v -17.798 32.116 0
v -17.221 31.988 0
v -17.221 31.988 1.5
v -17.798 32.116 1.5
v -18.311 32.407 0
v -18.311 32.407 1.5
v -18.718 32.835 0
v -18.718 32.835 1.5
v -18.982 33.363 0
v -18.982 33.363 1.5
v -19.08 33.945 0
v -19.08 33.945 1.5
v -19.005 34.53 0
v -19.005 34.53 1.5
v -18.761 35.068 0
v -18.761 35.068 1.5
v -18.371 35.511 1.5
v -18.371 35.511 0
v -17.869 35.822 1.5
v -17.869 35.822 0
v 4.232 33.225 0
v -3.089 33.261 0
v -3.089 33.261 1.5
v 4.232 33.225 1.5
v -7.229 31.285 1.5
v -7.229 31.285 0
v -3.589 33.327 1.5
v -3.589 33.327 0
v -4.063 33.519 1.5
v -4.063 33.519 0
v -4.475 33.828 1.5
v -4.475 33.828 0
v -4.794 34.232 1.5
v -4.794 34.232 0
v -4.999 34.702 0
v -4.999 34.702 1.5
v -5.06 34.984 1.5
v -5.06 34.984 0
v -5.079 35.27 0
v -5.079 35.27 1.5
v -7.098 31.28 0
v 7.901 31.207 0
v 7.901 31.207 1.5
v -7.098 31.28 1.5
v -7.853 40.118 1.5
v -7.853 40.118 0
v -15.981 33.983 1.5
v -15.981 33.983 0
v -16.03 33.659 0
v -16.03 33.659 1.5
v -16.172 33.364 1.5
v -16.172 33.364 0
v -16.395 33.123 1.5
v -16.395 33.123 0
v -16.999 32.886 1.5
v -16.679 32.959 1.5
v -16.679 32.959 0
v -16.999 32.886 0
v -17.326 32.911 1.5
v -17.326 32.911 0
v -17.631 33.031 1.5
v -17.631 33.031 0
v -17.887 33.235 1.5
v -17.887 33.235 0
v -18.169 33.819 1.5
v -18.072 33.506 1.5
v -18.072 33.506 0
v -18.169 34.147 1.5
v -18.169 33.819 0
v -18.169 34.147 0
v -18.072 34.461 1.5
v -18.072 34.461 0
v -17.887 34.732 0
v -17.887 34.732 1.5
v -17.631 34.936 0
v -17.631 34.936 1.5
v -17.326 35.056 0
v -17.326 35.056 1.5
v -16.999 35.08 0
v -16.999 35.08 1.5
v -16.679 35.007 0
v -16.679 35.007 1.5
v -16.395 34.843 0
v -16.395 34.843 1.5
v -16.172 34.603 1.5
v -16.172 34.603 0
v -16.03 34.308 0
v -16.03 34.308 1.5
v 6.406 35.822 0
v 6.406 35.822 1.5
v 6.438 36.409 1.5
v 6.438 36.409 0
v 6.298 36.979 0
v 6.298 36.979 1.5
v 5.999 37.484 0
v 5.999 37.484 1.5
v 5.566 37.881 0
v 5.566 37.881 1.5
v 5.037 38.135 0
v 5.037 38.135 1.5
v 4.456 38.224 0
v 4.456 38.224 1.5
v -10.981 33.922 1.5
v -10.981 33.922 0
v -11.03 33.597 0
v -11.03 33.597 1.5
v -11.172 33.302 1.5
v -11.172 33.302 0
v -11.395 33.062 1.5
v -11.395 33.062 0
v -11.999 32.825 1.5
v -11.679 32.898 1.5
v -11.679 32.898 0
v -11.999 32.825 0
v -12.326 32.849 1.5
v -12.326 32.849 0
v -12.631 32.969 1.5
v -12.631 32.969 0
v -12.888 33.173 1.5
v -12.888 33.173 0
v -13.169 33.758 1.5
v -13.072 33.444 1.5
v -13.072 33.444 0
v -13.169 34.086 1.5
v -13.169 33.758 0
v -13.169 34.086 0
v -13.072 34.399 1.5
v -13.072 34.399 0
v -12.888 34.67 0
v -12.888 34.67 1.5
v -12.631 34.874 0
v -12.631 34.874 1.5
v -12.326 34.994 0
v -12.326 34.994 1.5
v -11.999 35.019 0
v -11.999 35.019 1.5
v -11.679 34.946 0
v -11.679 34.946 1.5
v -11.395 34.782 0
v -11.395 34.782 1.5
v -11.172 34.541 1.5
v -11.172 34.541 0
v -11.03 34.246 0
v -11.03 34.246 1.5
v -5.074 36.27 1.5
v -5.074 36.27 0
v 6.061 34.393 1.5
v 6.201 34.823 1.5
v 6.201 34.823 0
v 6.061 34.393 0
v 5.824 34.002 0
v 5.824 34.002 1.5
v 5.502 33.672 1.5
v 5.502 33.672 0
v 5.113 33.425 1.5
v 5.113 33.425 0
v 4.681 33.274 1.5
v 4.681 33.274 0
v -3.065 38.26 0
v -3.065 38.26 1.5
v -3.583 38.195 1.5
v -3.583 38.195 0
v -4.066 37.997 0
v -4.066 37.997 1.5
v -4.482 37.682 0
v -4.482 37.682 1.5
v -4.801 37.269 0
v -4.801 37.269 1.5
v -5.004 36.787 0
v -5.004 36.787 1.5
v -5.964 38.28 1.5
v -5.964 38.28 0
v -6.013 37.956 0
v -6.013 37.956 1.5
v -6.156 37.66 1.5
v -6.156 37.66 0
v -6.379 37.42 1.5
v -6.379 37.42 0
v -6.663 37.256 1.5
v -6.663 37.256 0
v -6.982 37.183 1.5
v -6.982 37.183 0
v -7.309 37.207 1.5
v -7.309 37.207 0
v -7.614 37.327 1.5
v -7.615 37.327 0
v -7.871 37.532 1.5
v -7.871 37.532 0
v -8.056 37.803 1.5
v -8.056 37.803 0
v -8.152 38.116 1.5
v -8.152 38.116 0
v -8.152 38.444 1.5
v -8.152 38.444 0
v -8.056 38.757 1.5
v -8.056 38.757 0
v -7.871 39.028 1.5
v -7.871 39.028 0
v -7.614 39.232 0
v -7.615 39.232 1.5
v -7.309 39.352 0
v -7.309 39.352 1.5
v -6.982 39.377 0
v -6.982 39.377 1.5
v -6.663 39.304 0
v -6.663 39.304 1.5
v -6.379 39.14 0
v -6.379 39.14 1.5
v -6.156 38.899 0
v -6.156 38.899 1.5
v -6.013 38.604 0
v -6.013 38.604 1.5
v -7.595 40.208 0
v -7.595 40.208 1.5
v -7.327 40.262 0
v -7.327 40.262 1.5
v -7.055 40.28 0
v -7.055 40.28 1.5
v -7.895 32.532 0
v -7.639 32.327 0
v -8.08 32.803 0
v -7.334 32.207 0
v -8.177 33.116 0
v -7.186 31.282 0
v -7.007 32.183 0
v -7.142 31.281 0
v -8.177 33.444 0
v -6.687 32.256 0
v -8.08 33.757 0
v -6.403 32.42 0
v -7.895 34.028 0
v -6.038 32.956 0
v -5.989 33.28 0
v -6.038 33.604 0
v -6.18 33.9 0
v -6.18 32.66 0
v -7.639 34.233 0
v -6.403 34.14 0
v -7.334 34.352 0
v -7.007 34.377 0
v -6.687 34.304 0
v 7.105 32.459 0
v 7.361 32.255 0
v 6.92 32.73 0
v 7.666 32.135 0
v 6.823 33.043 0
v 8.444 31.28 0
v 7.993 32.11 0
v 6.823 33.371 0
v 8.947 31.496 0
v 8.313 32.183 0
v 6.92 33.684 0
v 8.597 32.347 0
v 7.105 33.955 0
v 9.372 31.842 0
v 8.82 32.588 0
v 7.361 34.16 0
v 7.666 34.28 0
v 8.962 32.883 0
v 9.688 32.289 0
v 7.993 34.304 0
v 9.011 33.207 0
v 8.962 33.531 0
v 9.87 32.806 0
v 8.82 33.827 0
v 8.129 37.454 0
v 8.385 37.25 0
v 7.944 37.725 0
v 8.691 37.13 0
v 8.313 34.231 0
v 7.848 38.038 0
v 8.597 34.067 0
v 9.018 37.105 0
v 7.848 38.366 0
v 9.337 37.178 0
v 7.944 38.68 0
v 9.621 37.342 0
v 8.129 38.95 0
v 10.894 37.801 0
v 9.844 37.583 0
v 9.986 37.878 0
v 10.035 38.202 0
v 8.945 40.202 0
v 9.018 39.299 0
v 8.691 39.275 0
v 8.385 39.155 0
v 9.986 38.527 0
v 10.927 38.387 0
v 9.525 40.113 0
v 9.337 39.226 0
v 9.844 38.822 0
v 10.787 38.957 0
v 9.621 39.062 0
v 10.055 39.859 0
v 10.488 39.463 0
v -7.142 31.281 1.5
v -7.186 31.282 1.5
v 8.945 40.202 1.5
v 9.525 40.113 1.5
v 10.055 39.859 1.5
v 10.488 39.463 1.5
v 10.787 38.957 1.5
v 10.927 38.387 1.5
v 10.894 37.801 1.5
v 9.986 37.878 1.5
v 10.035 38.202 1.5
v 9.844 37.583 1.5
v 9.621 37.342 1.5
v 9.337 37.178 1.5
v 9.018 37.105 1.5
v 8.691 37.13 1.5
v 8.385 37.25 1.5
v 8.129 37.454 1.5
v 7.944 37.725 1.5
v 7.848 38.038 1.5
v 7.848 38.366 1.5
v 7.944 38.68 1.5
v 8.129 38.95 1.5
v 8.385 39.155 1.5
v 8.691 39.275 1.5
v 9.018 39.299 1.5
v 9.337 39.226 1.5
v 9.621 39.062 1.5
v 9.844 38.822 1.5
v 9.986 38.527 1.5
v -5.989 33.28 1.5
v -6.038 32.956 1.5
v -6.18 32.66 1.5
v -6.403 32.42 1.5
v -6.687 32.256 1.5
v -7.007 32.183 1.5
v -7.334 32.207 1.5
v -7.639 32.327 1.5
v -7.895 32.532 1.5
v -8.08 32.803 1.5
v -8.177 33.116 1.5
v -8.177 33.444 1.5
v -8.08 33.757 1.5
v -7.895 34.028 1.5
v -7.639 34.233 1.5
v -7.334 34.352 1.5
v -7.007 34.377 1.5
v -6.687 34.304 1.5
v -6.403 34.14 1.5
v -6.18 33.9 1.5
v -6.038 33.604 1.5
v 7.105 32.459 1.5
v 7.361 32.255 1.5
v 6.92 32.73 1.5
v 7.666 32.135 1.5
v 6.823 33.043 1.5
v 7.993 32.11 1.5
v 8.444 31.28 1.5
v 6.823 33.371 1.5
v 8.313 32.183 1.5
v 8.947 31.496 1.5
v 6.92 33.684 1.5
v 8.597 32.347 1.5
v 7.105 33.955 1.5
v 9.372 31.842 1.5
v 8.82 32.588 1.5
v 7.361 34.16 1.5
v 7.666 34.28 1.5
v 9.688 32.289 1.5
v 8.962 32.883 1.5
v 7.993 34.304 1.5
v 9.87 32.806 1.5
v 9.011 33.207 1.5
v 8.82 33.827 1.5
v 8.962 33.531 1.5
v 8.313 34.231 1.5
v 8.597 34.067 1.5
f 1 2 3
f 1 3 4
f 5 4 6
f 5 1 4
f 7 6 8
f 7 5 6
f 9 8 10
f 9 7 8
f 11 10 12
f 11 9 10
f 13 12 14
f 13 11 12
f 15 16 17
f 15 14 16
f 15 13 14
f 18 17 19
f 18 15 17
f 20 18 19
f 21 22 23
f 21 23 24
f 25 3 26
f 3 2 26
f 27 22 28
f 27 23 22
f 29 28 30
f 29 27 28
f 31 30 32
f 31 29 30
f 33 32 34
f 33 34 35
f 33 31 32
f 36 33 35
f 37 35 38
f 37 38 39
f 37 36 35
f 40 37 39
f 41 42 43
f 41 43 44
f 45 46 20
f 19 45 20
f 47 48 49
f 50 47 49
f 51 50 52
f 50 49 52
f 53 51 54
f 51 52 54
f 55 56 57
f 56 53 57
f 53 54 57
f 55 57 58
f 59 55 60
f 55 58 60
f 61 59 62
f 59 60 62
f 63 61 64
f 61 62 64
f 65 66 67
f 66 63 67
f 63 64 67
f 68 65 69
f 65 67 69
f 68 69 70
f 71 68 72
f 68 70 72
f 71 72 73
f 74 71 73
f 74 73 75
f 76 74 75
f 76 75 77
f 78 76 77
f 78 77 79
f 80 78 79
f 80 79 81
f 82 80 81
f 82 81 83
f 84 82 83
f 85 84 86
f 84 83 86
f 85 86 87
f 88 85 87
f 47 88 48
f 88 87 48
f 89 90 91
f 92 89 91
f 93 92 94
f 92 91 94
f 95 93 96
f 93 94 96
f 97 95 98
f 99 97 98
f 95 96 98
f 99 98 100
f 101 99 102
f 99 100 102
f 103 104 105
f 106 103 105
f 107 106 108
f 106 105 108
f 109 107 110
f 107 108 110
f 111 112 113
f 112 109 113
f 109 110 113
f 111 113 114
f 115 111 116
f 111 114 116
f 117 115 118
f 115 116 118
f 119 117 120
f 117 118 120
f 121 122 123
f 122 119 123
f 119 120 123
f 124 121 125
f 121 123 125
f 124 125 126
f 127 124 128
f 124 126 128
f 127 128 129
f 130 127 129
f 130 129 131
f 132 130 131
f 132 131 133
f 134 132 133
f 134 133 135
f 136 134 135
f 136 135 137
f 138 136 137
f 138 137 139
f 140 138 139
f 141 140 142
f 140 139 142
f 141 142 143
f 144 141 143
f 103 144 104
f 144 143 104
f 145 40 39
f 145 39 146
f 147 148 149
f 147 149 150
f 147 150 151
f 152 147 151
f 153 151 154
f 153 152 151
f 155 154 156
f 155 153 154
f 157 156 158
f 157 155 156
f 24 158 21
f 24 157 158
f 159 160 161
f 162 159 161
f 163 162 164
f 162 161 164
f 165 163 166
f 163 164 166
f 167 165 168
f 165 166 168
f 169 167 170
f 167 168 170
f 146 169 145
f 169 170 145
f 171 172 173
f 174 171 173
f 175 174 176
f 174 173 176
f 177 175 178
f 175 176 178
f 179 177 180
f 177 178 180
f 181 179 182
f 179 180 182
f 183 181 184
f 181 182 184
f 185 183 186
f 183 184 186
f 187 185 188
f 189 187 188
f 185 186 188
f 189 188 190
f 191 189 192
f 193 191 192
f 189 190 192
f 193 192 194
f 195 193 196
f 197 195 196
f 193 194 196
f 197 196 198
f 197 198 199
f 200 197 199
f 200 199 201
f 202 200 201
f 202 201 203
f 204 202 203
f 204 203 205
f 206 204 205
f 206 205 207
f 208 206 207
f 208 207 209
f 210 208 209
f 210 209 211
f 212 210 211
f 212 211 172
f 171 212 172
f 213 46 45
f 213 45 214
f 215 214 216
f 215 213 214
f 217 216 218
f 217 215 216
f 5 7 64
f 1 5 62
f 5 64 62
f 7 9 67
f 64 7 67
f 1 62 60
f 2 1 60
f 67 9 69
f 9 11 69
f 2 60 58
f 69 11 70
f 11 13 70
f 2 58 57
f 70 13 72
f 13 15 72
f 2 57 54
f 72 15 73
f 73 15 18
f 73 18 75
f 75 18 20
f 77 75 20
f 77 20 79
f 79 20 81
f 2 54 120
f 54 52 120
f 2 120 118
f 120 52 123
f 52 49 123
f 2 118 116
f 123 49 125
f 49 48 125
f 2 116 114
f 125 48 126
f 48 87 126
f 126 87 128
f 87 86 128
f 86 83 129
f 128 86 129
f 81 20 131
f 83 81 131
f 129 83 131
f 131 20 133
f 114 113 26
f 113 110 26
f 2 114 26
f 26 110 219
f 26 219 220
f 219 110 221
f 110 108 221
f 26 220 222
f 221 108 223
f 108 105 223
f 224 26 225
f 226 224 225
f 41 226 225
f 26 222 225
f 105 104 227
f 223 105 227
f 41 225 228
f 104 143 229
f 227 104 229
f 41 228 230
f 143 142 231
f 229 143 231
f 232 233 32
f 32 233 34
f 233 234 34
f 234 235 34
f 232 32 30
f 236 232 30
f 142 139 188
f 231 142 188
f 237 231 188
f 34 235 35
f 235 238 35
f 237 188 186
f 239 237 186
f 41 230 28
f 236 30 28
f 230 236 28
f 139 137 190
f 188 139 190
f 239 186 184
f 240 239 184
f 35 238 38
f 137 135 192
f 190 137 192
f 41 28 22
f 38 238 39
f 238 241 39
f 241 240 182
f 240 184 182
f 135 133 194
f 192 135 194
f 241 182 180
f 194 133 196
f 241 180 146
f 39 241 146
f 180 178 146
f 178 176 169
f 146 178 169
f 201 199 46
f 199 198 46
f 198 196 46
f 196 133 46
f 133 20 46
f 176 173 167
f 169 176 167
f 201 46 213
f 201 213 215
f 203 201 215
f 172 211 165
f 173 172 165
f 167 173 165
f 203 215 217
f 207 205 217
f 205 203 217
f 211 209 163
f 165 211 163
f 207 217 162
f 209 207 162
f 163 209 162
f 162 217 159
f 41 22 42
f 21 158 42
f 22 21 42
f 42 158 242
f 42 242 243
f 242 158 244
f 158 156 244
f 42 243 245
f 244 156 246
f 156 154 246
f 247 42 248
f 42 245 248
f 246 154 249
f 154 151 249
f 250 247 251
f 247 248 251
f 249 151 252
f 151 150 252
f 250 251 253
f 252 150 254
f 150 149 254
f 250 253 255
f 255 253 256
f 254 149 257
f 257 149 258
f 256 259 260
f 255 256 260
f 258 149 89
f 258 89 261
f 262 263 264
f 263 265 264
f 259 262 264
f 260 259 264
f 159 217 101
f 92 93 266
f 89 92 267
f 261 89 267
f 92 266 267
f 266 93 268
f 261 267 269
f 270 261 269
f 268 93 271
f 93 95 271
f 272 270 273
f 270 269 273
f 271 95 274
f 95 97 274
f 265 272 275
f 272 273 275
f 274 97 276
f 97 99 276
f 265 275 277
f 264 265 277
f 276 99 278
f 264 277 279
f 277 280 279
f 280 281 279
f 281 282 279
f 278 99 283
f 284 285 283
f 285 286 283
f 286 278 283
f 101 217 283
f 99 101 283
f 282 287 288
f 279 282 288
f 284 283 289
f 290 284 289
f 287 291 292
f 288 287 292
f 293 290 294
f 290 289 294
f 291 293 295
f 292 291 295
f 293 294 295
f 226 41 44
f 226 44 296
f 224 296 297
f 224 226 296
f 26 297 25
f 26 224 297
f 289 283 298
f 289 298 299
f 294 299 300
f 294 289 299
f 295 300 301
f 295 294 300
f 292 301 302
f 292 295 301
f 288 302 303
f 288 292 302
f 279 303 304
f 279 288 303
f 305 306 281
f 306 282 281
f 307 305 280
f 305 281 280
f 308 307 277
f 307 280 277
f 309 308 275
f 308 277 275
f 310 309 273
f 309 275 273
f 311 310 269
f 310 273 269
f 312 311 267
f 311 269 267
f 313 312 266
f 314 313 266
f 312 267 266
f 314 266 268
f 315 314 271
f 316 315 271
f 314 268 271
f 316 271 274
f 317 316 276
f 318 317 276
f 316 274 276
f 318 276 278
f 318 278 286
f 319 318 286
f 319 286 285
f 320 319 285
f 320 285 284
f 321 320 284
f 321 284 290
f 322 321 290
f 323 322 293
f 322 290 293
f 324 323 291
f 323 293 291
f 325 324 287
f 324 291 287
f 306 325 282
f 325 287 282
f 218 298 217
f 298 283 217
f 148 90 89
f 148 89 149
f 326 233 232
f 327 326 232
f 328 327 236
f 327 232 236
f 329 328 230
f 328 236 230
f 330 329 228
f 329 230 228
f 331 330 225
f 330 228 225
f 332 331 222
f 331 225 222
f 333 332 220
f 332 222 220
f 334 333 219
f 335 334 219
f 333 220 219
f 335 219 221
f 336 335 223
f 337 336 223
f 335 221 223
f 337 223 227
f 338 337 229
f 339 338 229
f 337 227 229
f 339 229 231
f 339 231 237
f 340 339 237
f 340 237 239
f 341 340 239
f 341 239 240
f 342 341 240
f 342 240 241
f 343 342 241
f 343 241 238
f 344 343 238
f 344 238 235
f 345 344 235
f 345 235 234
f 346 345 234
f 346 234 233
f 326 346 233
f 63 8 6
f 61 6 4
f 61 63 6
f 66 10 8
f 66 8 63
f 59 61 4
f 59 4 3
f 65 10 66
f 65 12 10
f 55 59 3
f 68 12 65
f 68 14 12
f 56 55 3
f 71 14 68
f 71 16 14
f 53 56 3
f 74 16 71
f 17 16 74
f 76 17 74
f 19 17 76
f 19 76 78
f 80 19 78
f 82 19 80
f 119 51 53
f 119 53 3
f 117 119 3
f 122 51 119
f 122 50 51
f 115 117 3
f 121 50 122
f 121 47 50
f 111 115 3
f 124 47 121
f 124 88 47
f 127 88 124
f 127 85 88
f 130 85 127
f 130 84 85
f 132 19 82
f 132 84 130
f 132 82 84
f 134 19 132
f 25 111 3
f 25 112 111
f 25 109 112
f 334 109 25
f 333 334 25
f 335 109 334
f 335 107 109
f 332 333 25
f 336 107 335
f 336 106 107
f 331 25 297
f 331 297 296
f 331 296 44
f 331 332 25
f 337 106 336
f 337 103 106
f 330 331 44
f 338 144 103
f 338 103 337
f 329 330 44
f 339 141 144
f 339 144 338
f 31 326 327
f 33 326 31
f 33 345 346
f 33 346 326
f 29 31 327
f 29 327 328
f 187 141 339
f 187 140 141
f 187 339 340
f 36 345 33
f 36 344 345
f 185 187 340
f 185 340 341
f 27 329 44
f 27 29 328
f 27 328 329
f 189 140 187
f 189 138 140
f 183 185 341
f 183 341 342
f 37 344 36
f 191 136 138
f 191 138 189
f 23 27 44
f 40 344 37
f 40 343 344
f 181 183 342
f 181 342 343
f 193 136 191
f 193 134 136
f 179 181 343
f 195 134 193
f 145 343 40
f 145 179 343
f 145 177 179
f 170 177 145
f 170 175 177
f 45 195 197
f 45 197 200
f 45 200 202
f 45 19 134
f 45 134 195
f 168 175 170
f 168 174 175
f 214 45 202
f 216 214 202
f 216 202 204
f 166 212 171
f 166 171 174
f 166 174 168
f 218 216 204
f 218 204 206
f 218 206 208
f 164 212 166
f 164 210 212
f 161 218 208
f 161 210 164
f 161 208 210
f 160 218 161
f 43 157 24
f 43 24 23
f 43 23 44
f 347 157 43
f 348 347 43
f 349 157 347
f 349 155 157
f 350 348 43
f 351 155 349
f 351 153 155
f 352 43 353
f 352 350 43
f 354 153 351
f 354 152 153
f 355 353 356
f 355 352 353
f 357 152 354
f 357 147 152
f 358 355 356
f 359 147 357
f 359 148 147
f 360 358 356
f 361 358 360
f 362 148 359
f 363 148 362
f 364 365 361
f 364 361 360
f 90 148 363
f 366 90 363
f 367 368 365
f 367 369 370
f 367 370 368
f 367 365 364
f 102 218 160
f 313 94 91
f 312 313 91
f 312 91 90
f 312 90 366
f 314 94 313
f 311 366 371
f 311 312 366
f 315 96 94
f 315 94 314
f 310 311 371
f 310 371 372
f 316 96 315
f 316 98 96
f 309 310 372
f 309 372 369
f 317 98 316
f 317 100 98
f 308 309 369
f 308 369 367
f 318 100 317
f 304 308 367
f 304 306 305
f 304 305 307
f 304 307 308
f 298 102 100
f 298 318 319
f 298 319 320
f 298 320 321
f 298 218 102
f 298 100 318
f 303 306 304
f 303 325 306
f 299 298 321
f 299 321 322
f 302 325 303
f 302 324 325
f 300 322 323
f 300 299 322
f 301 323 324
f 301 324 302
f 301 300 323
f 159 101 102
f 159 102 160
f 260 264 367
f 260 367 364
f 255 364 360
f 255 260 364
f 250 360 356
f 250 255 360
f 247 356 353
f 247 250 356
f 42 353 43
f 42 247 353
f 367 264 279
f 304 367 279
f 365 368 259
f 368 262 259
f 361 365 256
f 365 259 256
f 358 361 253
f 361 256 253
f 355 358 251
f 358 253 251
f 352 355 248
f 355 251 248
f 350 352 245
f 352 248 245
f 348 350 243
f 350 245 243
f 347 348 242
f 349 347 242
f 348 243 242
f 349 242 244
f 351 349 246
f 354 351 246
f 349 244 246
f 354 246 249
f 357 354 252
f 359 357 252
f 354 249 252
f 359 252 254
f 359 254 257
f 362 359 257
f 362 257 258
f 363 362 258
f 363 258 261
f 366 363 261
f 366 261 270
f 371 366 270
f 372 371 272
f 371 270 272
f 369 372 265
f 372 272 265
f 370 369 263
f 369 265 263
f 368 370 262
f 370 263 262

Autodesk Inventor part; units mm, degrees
ref_plane "YZ Plane" through (0, 0, 0) normal (1, 0, 0) x (0, 1, 0)
ref_plane "XZ Plane" through (0, 0, 0) normal (0, 1, 0) x (-1, 0, 0)
ref_plane "XY Plane" through (0, 0, 0) normal (0, 0, 1) x (1, 0, 0)
sketch "スケッチ1" plane through (0, 0, 0) normal (0, 0, 1) x (1, 0, 0)
  circle A0 centre (7.9111, 33.2072) radius 1.1
  circle A1 centre (8.9353, 38.2023) radius 1.1
  circle A2 centre (-7.0645, 38.2798) radius 1.1
  circle A3 centre (-7.0888, 33.2799) radius 1.1
  spline S0 degree 3 poles (-12.8646, 33.9313) (-12.8659, 33.8333) (-12.8476, 33.7285) (-12.7708, 33.5355) (-12.7123, 33.4473) (-12.5725, 33.3024) (-12.4805, 33.2392) (-12.2855, 33.1578) (-12.1826, 33.1393) (-11.9746, 33.1367) (-11.8589, 33.1621) (-11.6558, 33.2543) (-11.5682, 33.3207) (-11.4449, 33.4571) (-11.3945, 33.5329) (-11.3402, 33.6628) (-11.3255, 33.7089) (-11.3046, 33.8062) (-11.2984, 33.8576) (-11.2971, 33.9662) (-11.302, 34.0177) (-11.3205, 34.1156) (-11.334, 34.1619) (-11.3851, 34.2932) (-11.4336, 34.3702) (-11.5535, 34.5096) (-11.6394, 34.5782) (-11.8401, 34.6754) (-11.9552, 34.7036) (-12.1632, 34.7062) (-12.2665, 34.6902) (-12.4635, 34.6136) (-12.557, 34.5528) (-12.7004, 34.4113) (-12.7611, 34.3246) (-12.8426, 34.1336) (-12.8634, 34.0293) (-12.8646, 33.9313) knots 0 0 0 0 0.029408 0.029408 0.058816 0.058816 0.090592 0.090592 0.122368 0.122368 0.162647 0.162647 0.202927 0.202927 0.235498 0.235498 0.251784 0.251784 0.26807 0.26807 0.284355 0.284355 0.300641 0.300641 0.333213 0.333213 0.373492 0.373492 0.413772 0.413772 0.445548 0.445548 0.477323 0.477323 0.506731 0.506731 0.536139 0.536139 0.536139 0.536139
  circle A4 centre (-17.0808, 33.9834) radius 0.7835
  arc A5 (-11.6308, 33.2805) -> (-11.6151, 34.5514) centre (-12.0812, 33.9216) ccw construction
  circle A6 centre (-12.0812, 33.9216) radius 1.1
  circle A7 centre (-17.0808, 33.9834) radius 1.1
  circle A8 centre (8.9353, 38.2023) radius 2
  circle A9 centre (-7.0645, 38.2798) radius 2
  circle A10 centre (-7.0888, 33.2799) radius 2
  circle A11 centre (7.9111, 33.2072) radius 2
  circle A12 centre (-12.0812, 33.9216) radius 2
  circle A13 centre (-17.0808, 33.9834) radius 2
  line L0 (8.945, 40.2023) -> (-7.0548, 40.2798)
  line L1 (9.8703, 32.8055) -> (10.8945, 37.8006)
  line L2 (7.9014, 31.2072) -> (-7.0985, 31.2799)
  line L3 (-7.8529, 40.1179) -> (-17.8692, 35.8215)
  line L4 (-17.2213, 31.9884) -> (-7.2292, 31.2848)
  line L5 (6.9761, 38.604) -> (5.9518, 33.6089)
  line L6 (8.9353, 38.2023) -> (-7.0645, 38.2798)
  line L7 (-5.0888, 33.2702) -> (-5.0645, 38.2701)
  line L8 (-7.0888, 33.2799) -> (7.9111, 33.2072)
  point P0 (0, 0)
  point P1 (-12.8646, 33.9313)
  point P2 (6.9353, 38.212)
  point P3 (6.8957, 38.2122)
  point P4 (5.9111, 33.2169)
extrude "押し出し1" add sketch "スケッチ1" along normal blind 1.5 contours A8 | A8 L5 L6 A9 L0 | L1 A11 L5 L6 A8 | A8 L6 L5 | A9 | A11 | A9 L7 A10 L4 A13 L3 | L2 A10 L8 A11 | A13 | A10 | A12
fillet "フィレット1" radius 2 4 edges at (6.8957, 38.2122, 0.75) (5.9111, 33.2169, 0.75) (-5.0645, 38.2701, 0.75) (-5.0888, 33.2702, 0.75)
properties part number "ude_tunagi" material "アルミニウム 2014-T4"
